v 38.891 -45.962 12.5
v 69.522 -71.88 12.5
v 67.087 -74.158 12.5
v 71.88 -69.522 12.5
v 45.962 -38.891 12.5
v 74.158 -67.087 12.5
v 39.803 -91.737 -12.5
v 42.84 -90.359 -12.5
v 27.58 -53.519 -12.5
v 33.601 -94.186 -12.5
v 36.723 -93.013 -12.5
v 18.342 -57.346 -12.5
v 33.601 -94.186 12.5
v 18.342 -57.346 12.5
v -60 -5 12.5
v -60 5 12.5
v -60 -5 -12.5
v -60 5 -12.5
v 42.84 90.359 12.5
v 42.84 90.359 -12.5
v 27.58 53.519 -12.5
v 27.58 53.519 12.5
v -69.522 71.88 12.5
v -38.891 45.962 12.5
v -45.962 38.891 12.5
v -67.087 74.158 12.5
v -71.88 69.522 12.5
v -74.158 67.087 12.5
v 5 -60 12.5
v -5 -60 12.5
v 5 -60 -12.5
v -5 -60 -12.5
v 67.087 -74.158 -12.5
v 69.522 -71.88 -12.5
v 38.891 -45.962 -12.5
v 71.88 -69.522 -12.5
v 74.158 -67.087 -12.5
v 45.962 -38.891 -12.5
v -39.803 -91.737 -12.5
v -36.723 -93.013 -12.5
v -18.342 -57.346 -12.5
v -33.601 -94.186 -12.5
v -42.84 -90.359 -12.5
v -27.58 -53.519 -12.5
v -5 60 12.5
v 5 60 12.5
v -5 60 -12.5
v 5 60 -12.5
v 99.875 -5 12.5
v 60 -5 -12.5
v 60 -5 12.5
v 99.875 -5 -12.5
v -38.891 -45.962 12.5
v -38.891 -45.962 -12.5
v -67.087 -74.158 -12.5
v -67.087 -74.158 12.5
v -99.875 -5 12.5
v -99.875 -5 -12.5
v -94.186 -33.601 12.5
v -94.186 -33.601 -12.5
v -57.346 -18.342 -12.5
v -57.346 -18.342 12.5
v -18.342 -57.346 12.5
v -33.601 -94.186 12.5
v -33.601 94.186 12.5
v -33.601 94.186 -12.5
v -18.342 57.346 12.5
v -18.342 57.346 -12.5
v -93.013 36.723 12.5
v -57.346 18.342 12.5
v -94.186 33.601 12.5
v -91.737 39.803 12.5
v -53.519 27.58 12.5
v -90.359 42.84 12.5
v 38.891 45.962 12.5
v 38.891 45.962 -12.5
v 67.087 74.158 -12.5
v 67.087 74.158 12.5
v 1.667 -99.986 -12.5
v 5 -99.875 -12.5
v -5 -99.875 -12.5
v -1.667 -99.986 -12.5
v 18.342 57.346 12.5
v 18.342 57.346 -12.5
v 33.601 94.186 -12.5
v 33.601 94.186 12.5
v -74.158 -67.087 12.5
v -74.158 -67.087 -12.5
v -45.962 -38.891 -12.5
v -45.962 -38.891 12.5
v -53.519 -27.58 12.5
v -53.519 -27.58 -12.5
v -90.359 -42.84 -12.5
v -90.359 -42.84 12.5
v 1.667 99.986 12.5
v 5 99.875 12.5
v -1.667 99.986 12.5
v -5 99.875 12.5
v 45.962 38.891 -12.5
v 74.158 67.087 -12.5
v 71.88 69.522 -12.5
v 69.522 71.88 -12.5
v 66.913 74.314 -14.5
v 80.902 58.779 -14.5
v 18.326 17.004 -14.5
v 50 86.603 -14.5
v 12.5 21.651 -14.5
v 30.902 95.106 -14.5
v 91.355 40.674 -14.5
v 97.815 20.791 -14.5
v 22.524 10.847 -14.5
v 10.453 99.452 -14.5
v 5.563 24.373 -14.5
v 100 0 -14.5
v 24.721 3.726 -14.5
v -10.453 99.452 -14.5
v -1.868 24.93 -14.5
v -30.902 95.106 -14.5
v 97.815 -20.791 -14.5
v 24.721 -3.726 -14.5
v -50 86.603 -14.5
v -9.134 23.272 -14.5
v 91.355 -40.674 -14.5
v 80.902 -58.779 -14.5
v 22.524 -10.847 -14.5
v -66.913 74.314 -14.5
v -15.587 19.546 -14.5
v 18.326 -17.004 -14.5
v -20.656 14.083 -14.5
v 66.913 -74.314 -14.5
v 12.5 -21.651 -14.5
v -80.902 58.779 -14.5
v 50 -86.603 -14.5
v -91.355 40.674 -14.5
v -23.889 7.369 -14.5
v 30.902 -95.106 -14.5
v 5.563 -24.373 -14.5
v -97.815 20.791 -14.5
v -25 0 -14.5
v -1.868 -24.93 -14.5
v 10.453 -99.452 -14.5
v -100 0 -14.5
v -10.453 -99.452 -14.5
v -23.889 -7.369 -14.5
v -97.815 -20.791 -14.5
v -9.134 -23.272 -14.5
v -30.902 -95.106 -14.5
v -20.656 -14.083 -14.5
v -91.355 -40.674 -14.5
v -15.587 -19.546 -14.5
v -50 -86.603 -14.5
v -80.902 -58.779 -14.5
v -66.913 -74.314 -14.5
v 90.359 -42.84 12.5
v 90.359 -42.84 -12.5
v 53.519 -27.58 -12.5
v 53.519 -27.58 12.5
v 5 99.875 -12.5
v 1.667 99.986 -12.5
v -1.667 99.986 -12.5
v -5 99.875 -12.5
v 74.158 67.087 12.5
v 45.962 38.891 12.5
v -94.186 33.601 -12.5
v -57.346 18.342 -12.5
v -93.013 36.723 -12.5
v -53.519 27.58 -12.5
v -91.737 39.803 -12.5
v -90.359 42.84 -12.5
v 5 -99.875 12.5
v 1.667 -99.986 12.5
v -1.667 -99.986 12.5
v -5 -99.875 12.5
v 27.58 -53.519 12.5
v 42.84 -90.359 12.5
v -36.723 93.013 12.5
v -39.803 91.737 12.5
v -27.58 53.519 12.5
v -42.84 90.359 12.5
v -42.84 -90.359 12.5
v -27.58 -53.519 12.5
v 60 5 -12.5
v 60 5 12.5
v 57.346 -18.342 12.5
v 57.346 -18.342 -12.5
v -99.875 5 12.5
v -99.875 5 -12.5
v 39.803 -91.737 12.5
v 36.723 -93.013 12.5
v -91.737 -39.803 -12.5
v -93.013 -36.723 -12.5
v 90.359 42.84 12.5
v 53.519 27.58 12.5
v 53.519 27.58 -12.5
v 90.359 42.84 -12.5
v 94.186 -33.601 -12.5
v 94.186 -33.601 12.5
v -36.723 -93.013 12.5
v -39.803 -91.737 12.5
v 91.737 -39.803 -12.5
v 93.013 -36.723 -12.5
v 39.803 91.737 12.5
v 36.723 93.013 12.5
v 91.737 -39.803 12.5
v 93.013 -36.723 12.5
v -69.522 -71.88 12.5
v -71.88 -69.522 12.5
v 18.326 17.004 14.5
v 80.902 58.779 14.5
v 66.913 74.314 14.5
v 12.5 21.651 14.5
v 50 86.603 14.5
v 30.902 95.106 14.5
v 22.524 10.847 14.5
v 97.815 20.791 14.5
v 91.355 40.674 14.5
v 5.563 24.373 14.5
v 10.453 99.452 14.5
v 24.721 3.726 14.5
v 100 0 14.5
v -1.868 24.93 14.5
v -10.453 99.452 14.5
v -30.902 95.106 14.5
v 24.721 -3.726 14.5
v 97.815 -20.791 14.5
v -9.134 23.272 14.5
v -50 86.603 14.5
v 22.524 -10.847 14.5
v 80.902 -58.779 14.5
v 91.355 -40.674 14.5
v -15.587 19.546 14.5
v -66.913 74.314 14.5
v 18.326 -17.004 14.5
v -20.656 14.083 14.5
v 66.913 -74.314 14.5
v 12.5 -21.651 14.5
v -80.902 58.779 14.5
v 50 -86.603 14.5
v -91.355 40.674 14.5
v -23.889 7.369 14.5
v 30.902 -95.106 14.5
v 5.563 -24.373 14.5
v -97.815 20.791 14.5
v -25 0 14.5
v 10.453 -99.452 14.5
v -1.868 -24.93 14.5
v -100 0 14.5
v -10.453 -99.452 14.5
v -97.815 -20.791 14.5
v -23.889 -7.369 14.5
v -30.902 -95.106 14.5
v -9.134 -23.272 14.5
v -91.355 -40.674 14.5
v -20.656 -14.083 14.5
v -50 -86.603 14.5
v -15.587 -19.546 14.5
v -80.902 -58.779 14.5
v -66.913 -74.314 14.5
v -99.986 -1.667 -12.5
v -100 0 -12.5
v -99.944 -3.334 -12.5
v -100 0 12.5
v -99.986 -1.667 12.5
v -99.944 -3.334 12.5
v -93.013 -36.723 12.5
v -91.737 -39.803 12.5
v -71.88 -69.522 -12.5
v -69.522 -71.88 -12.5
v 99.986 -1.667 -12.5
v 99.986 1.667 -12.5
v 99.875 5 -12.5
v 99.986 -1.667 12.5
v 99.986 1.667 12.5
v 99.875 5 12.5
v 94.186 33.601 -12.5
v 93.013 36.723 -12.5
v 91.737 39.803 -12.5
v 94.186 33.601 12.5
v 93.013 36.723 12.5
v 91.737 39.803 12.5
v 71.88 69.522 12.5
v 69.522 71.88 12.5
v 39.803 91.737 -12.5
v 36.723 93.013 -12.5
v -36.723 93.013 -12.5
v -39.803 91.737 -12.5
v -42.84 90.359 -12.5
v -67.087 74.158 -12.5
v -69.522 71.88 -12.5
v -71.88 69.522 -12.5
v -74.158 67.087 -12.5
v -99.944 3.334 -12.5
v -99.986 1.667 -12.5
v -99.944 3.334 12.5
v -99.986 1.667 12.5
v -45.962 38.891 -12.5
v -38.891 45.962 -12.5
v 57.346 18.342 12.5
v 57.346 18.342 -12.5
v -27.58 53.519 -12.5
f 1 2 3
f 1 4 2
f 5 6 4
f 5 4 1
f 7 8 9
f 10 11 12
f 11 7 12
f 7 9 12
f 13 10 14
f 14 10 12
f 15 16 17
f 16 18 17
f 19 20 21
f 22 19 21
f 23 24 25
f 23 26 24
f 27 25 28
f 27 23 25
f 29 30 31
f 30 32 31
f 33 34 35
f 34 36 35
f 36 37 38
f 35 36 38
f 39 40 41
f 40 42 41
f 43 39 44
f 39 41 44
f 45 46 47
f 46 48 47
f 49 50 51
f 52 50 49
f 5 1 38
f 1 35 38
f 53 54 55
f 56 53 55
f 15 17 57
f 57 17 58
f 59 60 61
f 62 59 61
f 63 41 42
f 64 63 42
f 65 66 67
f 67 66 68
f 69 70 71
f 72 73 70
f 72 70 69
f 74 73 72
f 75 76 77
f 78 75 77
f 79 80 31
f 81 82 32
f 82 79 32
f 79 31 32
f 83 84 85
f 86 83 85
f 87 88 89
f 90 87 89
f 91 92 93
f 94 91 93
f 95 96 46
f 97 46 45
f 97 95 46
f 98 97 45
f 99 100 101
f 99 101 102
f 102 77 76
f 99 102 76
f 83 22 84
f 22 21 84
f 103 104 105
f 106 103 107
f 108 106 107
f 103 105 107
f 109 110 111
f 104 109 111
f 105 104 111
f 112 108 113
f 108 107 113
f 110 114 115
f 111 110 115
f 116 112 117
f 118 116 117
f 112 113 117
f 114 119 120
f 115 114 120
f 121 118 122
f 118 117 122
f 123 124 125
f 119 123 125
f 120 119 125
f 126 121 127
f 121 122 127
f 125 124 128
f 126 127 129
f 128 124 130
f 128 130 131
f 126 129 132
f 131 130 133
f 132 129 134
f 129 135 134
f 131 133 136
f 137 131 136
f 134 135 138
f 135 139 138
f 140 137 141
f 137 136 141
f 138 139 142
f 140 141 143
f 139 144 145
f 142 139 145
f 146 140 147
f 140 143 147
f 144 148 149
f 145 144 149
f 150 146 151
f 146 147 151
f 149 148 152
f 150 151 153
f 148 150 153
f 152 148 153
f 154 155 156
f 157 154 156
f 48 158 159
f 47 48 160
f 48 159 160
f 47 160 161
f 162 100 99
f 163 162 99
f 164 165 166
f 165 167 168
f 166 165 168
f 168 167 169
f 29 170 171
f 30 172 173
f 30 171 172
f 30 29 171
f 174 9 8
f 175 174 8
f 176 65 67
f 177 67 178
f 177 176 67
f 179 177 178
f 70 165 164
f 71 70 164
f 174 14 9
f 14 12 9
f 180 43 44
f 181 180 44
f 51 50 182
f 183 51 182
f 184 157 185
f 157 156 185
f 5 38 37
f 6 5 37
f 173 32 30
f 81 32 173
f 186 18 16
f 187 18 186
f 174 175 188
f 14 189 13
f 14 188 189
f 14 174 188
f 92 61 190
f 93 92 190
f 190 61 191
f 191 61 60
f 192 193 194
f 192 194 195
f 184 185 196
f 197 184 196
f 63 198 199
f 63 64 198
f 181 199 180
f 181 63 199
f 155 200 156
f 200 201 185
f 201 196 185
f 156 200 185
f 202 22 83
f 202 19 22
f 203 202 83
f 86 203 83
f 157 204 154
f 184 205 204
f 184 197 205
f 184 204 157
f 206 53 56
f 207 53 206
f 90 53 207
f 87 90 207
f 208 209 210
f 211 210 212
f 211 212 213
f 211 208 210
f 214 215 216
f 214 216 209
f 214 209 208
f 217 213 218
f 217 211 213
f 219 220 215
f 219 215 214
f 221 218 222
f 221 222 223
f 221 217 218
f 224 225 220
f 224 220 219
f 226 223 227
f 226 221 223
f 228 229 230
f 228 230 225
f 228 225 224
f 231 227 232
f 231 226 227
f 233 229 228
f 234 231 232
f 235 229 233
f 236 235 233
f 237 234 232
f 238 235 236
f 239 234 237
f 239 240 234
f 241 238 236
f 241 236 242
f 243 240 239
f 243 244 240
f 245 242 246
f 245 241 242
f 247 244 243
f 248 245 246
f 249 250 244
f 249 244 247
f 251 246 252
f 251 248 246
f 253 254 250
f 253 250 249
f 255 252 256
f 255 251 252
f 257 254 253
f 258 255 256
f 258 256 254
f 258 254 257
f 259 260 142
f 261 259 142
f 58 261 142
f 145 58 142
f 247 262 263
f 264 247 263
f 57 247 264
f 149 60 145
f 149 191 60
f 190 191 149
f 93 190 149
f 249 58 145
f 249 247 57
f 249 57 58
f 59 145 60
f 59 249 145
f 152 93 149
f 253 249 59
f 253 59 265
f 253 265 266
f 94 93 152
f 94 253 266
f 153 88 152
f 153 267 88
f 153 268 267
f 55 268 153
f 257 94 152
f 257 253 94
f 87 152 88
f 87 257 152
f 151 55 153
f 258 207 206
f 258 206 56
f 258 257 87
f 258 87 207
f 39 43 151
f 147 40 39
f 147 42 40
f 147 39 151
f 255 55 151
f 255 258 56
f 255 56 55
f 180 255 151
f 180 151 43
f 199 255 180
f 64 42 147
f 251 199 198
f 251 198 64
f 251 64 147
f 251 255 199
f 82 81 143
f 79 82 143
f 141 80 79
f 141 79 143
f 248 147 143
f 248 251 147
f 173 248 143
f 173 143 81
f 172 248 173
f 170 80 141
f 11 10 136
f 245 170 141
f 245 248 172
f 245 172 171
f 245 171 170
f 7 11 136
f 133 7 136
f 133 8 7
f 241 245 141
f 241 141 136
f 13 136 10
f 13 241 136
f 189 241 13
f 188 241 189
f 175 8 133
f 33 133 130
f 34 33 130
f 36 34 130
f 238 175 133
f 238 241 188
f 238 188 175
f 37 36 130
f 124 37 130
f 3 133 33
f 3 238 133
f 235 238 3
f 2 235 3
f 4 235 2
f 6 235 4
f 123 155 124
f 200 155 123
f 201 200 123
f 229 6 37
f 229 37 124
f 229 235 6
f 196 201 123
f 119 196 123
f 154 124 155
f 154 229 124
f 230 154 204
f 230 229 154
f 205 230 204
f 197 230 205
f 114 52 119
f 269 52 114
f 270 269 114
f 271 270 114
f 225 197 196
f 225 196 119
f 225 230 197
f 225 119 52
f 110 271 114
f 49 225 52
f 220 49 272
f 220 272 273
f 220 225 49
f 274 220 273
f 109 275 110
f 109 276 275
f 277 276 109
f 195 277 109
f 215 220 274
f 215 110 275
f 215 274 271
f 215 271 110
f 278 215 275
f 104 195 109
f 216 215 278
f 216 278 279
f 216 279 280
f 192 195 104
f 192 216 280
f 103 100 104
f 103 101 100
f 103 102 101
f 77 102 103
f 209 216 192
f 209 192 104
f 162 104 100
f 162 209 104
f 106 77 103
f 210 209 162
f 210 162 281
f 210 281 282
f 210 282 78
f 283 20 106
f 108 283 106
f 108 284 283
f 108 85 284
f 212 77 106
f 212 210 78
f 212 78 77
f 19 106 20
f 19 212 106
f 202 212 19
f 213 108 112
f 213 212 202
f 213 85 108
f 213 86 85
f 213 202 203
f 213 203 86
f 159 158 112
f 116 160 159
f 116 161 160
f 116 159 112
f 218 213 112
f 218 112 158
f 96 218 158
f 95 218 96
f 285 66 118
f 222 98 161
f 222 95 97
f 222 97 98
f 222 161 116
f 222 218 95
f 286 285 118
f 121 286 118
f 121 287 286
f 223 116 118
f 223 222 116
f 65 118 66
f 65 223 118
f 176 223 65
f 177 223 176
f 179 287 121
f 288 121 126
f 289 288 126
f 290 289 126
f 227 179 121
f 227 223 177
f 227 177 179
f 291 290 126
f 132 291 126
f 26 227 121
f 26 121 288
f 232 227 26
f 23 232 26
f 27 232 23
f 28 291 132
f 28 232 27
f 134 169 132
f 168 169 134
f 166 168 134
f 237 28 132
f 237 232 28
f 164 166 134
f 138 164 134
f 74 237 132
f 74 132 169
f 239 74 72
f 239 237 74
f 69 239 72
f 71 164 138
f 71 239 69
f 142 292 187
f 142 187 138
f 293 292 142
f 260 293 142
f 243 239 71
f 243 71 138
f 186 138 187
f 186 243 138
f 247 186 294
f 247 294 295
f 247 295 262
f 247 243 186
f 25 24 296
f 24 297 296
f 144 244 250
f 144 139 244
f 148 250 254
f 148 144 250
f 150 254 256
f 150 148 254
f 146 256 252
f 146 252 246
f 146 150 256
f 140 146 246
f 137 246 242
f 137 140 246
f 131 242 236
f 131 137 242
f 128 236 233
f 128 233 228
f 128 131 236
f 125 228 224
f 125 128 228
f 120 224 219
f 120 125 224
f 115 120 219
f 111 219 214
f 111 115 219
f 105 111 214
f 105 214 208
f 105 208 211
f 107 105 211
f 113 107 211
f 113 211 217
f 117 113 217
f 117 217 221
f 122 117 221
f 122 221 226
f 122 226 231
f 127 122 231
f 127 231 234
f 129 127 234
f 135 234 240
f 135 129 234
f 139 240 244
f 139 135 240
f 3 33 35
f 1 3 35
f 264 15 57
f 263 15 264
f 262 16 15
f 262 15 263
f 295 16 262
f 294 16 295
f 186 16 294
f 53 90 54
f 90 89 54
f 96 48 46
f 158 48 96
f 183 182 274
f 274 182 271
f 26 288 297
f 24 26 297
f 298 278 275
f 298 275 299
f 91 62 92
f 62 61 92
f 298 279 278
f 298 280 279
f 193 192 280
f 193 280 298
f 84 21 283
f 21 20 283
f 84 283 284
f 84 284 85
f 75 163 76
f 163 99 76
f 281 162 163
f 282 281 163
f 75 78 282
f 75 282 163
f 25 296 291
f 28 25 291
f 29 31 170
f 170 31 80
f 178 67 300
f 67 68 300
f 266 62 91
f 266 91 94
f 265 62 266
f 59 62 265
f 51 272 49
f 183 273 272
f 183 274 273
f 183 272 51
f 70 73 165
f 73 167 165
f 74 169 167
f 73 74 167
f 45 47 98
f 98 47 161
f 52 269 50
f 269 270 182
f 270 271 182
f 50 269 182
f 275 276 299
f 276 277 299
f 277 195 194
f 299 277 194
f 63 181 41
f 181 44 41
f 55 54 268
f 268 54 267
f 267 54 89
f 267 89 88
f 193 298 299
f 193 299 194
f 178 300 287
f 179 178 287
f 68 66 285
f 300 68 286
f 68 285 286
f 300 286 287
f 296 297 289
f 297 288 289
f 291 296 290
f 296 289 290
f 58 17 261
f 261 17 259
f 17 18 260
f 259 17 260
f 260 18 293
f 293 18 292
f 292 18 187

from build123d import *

# Parameters (mm, degrees)
SKETCH1_R           = 100
SKETCH1_R_2         = 25
BOSS_EXTRUDE1_DEPTH = 14.5
CUT_EXTRUDE1_DEPTH  = 12.5


with BuildPart() as part:
    # Sketch1 → Boss-Extrude1 (new, symmetric)
    with BuildSketch(Plane.XY):
        with Locations(Location((0, 0, 0), (0, 0, 180))):
            Circle(SKETCH1_R)
        with Locations(Location((0, 0, 0), (0, 0, 180))):
            Circle(SKETCH1_R_2, mode=Mode.SUBTRACT)
    extrude(amount=BOSS_EXTRUDE1_DEPTH, both=True)

    # Sketch2 → Cut-Extrude1 (cut, symmetric)
    with BuildSketch(Plane.XY):
        Polygon((100, 5), (110, -5), (100, -5), (60, -5), (60, 5), align=None)
        Polygon((57.346189113, -18.341608279), (94.301370413, -33.648945574), (99.713331414, -46.714575223), (90.474536089, -42.887740899), (53.519354789, -27.580403604), align=None)
        Polygon((45.961940777, -38.890872965), (74.246212025, -67.175144213), (74.246212025, -81.317279836), (67.175144213, -74.246212025), (38.890872965, -45.961940777), align=None)
        Polygon((27.580403604, -53.519354789), (42.887740899, -90.474536089), (37.475779898, -103.540165738), (33.648945574, -94.301370413), (18.341608279, -57.346189113), align=None)
        Polygon((5, -60), (5, -100), (-5, -110), (-5, -100), (-5, -60), align=None)
        Polygon((-18.341608279, -57.346189113), (-33.648945574, -94.301370413), (-46.714575223, -99.713331414), (-42.887740899, -90.474536089), (-27.580403604, -53.519354789), align=None)
        Polygon((-38.890872965, -45.961940777), (-67.175144213, -74.246212025), (-81.317279836, -74.246212025), (-74.246212025, -67.175144213), (-45.961940777, -38.890872965), align=None)
        Polygon((-53.519354789, -27.580403604), (-90.474536089, -42.887740899), (-103.540165738, -37.475779898), (-94.301370413, -33.648945574), (-57.346189113, -18.341608279), align=None)
        Polygon((-60, -5), (-100, -5), (-110, 5), (-100, 5), (-60, 5), align=None)
        Polygon((-57.346189113, 18.341608279), (-94.301370413, 33.648945574), (-99.713331414, 46.714575223), (-90.474536089, 42.887740899), (-53.519354789, 27.580403604), align=None)
        Polygon((-45.961940777, 38.890872965), (-74.246212025, 67.175144213), (-74.246212025, 81.317279836), (-67.175144213, 74.246212025), (-38.890872965, 45.961940777), align=None)
        Polygon((-27.580403604, 53.519354789), (-42.887740899, 90.474536089), (-37.475779898, 103.540165738), (-33.648945574, 94.301370413), (-18.341608279, 57.346189113), align=None)
        Polygon((-5, 60), (-5, 100), (5, 110), (5, 100), (5, 60), align=None)
        Polygon((18.341608279, 57.346189113), (33.648945574, 94.301370413), (46.714575223, 99.713331414), (42.887740899, 90.474536089), (27.580403604, 53.519354789), align=None)
        Polygon((38.890872965, 45.961940777), (67.175144213, 74.246212025), (81.317279836, 74.246212025), (74.246212025, 67.175144213), (45.961940777, 38.890872965), align=None)
        Polygon((53.519354789, 27.580403604), (90.474536089, 42.887740899), (103.540165738, 37.475779898), (94.301370413, 33.648945574), (57.346189113, 18.341608279), align=None)
    extrude(amount=CUT_EXTRUDE1_DEPTH, both=True, mode=Mode.SUBTRACT)


solid = part.part
